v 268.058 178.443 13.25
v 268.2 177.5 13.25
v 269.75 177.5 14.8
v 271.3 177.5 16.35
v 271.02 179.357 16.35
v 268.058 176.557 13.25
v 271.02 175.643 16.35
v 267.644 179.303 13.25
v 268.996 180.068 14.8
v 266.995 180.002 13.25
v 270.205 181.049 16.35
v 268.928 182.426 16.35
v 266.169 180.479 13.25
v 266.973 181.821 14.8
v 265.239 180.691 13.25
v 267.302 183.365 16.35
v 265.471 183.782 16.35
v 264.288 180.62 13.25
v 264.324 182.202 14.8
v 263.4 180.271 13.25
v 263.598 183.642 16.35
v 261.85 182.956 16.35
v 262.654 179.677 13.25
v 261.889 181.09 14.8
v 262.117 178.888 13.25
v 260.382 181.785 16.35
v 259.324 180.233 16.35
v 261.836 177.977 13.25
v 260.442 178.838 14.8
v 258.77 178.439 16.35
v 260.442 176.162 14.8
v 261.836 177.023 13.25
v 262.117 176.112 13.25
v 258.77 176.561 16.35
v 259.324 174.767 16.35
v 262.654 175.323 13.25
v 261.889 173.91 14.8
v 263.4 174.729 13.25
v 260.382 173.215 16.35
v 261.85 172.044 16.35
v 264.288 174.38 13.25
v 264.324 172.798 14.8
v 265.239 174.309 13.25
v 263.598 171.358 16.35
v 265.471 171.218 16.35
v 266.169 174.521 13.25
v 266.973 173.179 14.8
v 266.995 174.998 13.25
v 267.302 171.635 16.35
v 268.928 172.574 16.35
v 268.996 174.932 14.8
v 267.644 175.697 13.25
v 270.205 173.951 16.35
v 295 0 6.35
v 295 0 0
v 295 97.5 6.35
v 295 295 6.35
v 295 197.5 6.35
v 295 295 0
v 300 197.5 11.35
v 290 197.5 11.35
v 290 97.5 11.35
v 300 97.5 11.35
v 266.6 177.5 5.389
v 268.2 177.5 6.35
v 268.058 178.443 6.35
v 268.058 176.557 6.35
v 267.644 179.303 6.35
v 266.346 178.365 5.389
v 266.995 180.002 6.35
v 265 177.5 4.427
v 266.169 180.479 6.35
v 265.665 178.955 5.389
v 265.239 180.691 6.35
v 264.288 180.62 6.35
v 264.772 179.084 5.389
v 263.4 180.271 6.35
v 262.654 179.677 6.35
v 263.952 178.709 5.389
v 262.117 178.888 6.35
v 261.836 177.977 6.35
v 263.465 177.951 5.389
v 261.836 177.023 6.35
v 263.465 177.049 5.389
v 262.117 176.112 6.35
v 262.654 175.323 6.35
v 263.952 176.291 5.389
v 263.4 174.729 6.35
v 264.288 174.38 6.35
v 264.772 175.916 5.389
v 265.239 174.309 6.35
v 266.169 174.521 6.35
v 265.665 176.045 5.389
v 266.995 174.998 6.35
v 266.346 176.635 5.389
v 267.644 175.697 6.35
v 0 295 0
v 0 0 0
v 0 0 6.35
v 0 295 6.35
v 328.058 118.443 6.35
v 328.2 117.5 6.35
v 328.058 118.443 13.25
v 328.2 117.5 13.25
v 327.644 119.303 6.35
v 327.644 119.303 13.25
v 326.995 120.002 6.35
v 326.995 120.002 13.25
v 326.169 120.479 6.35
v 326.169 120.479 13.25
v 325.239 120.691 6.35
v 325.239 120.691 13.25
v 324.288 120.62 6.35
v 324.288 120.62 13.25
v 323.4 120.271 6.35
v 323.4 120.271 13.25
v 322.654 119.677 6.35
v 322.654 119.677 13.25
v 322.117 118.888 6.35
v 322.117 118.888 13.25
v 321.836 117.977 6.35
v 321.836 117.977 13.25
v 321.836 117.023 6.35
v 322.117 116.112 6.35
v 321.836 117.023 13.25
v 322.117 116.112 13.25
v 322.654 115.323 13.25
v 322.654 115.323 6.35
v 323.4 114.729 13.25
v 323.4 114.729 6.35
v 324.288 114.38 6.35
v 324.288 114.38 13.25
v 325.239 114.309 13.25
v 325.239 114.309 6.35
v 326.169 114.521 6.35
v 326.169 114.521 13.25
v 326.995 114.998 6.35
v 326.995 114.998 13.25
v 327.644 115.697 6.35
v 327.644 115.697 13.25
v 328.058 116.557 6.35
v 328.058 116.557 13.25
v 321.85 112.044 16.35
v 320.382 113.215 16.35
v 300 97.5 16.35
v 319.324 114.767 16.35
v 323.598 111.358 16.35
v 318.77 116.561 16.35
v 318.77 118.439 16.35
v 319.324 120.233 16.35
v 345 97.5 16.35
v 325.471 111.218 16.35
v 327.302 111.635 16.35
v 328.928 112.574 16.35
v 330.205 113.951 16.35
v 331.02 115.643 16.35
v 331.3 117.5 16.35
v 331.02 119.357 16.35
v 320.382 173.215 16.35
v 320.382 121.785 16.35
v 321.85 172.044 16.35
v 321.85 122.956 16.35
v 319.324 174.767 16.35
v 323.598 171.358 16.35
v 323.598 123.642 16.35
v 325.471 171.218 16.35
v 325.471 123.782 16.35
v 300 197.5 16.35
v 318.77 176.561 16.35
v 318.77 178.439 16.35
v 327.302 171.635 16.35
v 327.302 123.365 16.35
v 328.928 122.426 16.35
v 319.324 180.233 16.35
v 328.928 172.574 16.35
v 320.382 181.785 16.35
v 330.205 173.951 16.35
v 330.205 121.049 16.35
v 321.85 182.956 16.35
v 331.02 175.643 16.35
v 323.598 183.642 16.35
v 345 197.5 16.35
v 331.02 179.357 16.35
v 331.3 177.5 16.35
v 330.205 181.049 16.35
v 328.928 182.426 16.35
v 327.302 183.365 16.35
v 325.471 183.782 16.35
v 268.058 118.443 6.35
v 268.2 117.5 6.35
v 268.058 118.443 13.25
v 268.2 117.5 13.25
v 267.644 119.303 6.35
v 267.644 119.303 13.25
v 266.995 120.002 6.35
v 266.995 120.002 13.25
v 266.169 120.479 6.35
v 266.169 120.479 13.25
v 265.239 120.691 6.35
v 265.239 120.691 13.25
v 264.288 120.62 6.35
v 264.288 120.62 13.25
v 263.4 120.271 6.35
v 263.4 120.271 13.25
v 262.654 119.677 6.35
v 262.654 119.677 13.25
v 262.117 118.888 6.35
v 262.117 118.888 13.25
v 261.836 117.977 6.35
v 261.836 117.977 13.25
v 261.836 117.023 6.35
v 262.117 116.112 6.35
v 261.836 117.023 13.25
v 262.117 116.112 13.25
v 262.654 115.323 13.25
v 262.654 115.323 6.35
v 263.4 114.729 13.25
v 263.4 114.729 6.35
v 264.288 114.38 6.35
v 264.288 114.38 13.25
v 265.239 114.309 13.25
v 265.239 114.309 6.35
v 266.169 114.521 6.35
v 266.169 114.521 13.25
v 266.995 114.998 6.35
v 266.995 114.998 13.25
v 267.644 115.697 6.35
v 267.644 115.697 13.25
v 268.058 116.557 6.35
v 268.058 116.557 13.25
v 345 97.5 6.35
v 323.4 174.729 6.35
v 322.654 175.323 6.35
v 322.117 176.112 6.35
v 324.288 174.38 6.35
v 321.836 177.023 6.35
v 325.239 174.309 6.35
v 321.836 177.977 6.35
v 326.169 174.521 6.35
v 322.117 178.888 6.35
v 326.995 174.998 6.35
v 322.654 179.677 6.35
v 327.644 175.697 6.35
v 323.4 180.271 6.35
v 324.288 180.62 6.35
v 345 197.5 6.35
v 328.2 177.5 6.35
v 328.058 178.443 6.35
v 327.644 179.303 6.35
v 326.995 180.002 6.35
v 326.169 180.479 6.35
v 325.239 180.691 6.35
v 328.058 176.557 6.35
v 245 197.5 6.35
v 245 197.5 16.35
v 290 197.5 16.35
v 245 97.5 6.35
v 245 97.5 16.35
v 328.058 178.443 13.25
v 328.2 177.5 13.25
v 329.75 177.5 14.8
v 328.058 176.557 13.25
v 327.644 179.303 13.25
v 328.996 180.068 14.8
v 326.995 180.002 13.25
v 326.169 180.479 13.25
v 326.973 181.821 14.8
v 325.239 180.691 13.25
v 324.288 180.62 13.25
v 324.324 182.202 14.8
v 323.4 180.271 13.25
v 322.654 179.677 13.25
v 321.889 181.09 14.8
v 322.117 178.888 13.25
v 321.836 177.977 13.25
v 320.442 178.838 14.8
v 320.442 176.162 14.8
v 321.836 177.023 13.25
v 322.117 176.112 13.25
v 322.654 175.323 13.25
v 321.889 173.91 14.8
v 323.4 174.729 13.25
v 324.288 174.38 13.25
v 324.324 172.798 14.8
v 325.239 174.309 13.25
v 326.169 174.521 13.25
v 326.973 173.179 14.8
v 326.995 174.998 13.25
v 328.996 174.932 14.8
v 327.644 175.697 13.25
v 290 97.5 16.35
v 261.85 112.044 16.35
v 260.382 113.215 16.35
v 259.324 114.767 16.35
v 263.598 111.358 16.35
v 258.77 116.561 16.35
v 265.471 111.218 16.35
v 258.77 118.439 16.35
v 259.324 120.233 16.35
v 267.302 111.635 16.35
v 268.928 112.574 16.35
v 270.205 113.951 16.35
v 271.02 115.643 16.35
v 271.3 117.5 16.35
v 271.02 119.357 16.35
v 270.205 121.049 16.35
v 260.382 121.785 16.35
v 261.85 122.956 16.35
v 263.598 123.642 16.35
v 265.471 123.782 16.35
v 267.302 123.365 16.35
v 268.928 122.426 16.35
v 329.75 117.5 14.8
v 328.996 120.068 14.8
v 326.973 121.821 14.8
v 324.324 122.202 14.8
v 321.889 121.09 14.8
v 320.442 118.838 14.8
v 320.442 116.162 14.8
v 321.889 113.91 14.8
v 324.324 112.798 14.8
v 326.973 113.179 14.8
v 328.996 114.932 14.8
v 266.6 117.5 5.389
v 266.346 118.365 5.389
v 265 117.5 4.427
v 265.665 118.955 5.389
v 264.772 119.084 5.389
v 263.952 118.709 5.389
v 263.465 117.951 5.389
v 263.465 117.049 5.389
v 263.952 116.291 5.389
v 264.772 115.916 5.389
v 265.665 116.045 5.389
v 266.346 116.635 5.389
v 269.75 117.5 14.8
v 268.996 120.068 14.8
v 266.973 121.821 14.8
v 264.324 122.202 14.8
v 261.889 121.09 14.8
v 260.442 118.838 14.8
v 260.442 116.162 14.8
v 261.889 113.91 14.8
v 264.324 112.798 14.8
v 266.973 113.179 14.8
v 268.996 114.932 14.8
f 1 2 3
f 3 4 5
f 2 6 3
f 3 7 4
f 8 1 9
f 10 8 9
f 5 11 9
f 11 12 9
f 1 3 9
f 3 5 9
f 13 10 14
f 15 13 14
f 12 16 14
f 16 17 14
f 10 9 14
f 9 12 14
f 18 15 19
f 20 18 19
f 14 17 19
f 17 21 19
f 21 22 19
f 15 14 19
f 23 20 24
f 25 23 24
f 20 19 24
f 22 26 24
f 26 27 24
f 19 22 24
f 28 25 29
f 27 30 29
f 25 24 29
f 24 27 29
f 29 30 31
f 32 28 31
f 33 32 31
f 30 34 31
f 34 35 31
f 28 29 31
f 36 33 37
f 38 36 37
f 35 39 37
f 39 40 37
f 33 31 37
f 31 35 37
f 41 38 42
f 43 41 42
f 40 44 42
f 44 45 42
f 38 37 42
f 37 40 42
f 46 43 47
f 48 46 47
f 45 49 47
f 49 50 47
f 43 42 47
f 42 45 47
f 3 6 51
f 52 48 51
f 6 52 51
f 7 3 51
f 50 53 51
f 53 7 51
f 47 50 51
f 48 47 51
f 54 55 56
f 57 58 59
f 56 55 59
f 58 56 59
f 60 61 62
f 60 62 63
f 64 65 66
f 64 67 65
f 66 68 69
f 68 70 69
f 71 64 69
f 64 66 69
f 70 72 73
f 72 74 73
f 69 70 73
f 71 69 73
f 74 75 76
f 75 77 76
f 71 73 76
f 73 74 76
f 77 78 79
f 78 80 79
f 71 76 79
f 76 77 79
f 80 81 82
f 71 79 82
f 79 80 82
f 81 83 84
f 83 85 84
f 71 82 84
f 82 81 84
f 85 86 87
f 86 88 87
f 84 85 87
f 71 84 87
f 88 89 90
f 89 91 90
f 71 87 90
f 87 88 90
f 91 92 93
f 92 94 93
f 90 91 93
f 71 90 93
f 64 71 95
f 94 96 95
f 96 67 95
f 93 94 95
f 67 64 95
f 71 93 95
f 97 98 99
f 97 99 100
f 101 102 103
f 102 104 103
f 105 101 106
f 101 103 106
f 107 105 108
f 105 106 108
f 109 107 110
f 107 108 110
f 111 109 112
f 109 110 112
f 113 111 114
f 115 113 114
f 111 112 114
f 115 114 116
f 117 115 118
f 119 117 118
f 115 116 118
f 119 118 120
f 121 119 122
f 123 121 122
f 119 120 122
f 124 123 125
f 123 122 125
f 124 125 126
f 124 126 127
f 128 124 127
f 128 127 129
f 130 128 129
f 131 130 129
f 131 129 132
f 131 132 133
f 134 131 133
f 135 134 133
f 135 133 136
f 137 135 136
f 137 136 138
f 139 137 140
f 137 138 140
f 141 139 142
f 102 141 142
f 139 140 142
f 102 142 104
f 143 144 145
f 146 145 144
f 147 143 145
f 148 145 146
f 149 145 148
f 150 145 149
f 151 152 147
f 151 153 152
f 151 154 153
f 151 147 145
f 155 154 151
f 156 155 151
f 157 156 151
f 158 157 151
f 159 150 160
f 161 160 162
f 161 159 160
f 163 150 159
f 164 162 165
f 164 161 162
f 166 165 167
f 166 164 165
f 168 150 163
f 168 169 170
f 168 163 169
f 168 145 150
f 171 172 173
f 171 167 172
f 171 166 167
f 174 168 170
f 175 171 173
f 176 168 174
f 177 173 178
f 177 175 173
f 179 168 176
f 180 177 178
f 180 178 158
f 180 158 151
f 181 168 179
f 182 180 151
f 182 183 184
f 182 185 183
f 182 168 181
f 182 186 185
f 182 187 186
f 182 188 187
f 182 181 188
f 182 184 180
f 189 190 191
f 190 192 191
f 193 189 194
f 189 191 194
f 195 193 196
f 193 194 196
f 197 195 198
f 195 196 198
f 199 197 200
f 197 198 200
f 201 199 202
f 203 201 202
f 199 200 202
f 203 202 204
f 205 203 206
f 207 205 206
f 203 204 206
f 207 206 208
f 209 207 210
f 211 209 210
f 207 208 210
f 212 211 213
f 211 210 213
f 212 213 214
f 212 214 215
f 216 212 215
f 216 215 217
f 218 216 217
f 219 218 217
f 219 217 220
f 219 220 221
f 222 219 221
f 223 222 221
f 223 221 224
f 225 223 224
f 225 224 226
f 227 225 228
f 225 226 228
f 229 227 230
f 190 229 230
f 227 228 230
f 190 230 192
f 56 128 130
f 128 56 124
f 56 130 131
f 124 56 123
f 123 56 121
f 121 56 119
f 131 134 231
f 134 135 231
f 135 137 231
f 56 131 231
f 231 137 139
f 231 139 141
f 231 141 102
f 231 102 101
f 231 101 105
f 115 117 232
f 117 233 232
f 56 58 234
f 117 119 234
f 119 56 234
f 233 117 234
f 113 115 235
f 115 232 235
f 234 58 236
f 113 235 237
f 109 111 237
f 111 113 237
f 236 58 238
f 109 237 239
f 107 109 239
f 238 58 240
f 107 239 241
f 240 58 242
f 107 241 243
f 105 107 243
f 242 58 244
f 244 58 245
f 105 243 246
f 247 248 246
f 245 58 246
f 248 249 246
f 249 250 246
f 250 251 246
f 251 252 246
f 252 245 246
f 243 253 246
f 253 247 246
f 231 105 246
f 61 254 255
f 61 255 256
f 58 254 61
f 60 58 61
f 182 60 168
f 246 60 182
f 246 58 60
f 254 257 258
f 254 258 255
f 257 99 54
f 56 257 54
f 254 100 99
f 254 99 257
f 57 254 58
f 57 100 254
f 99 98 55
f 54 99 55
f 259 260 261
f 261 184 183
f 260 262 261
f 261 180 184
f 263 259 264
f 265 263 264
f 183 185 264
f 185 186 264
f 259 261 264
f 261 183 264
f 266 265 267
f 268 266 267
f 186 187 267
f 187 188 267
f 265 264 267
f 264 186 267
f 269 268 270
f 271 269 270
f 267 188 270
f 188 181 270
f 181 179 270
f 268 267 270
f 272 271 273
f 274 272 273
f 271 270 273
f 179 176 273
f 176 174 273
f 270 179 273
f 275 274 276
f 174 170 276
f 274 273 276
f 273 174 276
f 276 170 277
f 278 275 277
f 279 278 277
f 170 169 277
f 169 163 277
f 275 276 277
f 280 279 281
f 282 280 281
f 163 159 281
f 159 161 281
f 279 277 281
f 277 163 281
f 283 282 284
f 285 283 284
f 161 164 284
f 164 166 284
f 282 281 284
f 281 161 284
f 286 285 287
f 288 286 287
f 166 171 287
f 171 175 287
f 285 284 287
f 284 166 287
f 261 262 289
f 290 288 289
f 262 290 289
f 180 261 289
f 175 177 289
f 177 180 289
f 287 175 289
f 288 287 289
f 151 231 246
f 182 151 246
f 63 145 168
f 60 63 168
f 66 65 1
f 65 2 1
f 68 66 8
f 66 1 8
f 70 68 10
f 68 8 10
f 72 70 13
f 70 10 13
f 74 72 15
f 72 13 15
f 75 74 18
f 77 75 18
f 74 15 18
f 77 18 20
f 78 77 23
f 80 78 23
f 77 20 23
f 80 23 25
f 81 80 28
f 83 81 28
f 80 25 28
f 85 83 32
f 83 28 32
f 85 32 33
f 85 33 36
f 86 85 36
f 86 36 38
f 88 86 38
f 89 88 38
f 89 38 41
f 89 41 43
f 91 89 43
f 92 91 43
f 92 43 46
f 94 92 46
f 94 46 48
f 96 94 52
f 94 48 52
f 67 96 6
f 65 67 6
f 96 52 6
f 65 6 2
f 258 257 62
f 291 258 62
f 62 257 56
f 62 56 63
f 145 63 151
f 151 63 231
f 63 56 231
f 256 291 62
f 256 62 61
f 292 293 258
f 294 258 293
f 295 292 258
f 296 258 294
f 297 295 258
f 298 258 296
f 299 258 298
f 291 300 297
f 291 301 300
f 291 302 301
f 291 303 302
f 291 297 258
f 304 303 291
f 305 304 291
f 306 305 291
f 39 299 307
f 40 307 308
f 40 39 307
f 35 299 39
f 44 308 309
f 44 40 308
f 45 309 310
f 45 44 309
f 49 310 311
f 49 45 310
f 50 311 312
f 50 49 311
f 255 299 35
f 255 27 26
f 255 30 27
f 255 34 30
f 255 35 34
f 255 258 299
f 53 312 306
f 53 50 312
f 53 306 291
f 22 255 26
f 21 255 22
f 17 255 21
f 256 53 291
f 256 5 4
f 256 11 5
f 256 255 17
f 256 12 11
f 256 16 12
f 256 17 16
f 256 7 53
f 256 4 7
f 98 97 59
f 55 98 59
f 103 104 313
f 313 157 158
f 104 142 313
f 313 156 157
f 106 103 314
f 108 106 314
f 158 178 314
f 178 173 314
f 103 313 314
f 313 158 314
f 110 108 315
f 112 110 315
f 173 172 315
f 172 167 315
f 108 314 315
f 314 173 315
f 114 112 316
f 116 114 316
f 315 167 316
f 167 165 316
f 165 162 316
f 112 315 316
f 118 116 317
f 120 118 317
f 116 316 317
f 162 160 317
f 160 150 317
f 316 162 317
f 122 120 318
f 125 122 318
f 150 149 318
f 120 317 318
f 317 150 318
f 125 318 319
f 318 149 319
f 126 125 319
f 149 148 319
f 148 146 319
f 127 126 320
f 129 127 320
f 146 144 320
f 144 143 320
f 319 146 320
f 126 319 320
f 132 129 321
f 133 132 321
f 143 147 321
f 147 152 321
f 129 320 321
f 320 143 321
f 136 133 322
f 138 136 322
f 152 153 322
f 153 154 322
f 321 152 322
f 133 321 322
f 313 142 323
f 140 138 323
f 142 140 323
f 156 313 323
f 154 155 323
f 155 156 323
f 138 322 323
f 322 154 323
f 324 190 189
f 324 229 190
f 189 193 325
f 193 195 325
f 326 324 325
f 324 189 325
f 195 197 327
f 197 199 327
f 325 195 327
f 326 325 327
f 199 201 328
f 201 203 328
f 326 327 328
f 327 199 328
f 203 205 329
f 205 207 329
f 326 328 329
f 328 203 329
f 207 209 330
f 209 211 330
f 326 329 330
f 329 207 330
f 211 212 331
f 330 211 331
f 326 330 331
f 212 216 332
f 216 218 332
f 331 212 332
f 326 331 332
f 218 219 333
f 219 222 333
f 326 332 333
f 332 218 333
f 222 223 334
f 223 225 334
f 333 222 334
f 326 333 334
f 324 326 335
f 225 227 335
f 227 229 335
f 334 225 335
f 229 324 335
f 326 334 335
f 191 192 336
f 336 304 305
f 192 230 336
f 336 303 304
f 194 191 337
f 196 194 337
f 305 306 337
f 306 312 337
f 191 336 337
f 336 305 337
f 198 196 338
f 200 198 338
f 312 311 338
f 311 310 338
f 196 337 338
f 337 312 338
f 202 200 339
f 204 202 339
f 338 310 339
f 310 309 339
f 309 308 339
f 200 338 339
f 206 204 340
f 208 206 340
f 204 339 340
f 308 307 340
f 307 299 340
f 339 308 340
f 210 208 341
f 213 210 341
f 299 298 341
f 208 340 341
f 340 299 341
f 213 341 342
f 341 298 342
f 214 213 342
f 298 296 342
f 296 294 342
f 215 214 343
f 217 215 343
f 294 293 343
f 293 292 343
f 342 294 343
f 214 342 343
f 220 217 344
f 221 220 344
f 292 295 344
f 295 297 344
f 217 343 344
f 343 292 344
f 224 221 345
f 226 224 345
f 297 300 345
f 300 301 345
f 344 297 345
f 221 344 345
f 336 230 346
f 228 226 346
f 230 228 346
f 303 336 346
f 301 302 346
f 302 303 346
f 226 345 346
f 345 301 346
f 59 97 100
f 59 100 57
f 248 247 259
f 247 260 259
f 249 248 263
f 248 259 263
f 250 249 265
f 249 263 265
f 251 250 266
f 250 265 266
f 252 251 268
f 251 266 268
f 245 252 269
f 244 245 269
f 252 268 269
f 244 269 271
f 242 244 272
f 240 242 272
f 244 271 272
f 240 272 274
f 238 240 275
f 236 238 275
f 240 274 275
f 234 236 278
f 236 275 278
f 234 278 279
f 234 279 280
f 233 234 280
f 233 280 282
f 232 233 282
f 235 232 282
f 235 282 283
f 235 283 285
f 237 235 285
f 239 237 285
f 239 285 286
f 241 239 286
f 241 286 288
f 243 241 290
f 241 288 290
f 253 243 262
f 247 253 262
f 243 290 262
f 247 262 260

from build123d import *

# Parameters (mm, degrees)
SKETCH1_W           = 295
SKETCH1_H           = 295
BOSS_EXTRUDE1_DEPTH = 6.35
SKETCH2_W           = 100
SKETCH2_H           = 100
BOSS_EXTRUDE2_DEPTH = 10
SKETCH6_W           = 10
SKETCH6_H           = 100
CUT_EXTRUDE1_DEPTH  = 5


# Read off the part's stored shape, not the designer's step: CSK for M6 Flat Head Machine Screw1
with BuildPart() as part:
    # Sketch1 → Boss-Extrude1 (new body)
    with BuildSketch(Plane.XY):
        with Locations((147.5, 147.5)):
            Rectangle(SKETCH1_W, SKETCH1_H)
    extrude(amount=BOSS_EXTRUDE1_DEPTH)

    # Sketch2 → Boss-Extrude2 (add)
    with BuildSketch(Plane.XY.offset(6.35)):
        with Locations((295, 147.5)):
            Rectangle(SKETCH2_W, SKETCH2_H)
    extrude(amount=BOSS_EXTRUDE2_DEPTH)

    # CSK for M6 Flat Head Machine Screw1 outl → CSK for M6 Flat Head Machine Screw1 (revolve, cut)
    with BuildSketch(Plane(origin=(325, 177.5, 0), x_dir=(1, 0, 0), z_dir=(0, -1, 0))):
        Polygon((0, 6.35), (3.2, 6.35), (3.2, 13.25), (6.3, 16.35), (0, 16.35), align=None)
    revolve(axis=Axis((325, 177.5, 0), (0, 0, 1)), mode=Mode.SUBTRACT)

    # CSK for M6 Flat Head Machine Screw1 2 ou → CSK for M6 Flat Head Machine Screw1 2 (revolve, cut)
    with BuildSketch(Plane(origin=(265, 117.5, 0), x_dir=(1, 0, 0), z_dir=(0, -1, 0))):
        Polygon((0, 16.35), (0, 4.427246019), (3.2, 6.35), (3.2, 13.25), (6.3, 16.35), align=None)
    revolve(axis=Axis((265, 117.5, 0), (0, 0, 1)), mode=Mode.SUBTRACT)

    # CSK for M6 Flat Head Machine Screw1 3 ou → CSK for M6 Flat Head Machine Screw1 3 (revolve, cut)
    with BuildSketch(Plane(origin=(325, 117.5, 0), x_dir=(1, 0, 0), z_dir=(0, -1, 0))):
        Polygon((0, 6.35), (3.2, 6.35), (3.2, 13.25), (6.3, 16.35), (0, 16.35), align=None)
    revolve(axis=Axis((325, 117.5, 0), (0, 0, 1)), mode=Mode.SUBTRACT)

    # CSK for M6 Flat Head Machine Screw1 4 ou → CSK for M6 Flat Head Machine Screw1 4 (revolve, cut)
    with BuildSketch(Plane(origin=(265, 177.5, 0), x_dir=(1, 0, 0), z_dir=(0, -1, 0))):
        Polygon((0, 16.35), (0, 4.427246019), (3.2, 6.35), (3.2, 13.25), (6.3, 16.35), align=None)
    revolve(axis=Axis((265, 177.5, 0), (0, 0, 1)), mode=Mode.SUBTRACT)

    # Sketch6 → Cut-Extrude1 (cut)
    with BuildSketch(Plane.XY.offset(16.35)):
        with Locations((295, 147.5)):
            Rectangle(SKETCH6_W, SKETCH6_H)
    extrude(amount=-CUT_EXTRUDE1_DEPTH, mode=Mode.SUBTRACT)


solid = part.part
